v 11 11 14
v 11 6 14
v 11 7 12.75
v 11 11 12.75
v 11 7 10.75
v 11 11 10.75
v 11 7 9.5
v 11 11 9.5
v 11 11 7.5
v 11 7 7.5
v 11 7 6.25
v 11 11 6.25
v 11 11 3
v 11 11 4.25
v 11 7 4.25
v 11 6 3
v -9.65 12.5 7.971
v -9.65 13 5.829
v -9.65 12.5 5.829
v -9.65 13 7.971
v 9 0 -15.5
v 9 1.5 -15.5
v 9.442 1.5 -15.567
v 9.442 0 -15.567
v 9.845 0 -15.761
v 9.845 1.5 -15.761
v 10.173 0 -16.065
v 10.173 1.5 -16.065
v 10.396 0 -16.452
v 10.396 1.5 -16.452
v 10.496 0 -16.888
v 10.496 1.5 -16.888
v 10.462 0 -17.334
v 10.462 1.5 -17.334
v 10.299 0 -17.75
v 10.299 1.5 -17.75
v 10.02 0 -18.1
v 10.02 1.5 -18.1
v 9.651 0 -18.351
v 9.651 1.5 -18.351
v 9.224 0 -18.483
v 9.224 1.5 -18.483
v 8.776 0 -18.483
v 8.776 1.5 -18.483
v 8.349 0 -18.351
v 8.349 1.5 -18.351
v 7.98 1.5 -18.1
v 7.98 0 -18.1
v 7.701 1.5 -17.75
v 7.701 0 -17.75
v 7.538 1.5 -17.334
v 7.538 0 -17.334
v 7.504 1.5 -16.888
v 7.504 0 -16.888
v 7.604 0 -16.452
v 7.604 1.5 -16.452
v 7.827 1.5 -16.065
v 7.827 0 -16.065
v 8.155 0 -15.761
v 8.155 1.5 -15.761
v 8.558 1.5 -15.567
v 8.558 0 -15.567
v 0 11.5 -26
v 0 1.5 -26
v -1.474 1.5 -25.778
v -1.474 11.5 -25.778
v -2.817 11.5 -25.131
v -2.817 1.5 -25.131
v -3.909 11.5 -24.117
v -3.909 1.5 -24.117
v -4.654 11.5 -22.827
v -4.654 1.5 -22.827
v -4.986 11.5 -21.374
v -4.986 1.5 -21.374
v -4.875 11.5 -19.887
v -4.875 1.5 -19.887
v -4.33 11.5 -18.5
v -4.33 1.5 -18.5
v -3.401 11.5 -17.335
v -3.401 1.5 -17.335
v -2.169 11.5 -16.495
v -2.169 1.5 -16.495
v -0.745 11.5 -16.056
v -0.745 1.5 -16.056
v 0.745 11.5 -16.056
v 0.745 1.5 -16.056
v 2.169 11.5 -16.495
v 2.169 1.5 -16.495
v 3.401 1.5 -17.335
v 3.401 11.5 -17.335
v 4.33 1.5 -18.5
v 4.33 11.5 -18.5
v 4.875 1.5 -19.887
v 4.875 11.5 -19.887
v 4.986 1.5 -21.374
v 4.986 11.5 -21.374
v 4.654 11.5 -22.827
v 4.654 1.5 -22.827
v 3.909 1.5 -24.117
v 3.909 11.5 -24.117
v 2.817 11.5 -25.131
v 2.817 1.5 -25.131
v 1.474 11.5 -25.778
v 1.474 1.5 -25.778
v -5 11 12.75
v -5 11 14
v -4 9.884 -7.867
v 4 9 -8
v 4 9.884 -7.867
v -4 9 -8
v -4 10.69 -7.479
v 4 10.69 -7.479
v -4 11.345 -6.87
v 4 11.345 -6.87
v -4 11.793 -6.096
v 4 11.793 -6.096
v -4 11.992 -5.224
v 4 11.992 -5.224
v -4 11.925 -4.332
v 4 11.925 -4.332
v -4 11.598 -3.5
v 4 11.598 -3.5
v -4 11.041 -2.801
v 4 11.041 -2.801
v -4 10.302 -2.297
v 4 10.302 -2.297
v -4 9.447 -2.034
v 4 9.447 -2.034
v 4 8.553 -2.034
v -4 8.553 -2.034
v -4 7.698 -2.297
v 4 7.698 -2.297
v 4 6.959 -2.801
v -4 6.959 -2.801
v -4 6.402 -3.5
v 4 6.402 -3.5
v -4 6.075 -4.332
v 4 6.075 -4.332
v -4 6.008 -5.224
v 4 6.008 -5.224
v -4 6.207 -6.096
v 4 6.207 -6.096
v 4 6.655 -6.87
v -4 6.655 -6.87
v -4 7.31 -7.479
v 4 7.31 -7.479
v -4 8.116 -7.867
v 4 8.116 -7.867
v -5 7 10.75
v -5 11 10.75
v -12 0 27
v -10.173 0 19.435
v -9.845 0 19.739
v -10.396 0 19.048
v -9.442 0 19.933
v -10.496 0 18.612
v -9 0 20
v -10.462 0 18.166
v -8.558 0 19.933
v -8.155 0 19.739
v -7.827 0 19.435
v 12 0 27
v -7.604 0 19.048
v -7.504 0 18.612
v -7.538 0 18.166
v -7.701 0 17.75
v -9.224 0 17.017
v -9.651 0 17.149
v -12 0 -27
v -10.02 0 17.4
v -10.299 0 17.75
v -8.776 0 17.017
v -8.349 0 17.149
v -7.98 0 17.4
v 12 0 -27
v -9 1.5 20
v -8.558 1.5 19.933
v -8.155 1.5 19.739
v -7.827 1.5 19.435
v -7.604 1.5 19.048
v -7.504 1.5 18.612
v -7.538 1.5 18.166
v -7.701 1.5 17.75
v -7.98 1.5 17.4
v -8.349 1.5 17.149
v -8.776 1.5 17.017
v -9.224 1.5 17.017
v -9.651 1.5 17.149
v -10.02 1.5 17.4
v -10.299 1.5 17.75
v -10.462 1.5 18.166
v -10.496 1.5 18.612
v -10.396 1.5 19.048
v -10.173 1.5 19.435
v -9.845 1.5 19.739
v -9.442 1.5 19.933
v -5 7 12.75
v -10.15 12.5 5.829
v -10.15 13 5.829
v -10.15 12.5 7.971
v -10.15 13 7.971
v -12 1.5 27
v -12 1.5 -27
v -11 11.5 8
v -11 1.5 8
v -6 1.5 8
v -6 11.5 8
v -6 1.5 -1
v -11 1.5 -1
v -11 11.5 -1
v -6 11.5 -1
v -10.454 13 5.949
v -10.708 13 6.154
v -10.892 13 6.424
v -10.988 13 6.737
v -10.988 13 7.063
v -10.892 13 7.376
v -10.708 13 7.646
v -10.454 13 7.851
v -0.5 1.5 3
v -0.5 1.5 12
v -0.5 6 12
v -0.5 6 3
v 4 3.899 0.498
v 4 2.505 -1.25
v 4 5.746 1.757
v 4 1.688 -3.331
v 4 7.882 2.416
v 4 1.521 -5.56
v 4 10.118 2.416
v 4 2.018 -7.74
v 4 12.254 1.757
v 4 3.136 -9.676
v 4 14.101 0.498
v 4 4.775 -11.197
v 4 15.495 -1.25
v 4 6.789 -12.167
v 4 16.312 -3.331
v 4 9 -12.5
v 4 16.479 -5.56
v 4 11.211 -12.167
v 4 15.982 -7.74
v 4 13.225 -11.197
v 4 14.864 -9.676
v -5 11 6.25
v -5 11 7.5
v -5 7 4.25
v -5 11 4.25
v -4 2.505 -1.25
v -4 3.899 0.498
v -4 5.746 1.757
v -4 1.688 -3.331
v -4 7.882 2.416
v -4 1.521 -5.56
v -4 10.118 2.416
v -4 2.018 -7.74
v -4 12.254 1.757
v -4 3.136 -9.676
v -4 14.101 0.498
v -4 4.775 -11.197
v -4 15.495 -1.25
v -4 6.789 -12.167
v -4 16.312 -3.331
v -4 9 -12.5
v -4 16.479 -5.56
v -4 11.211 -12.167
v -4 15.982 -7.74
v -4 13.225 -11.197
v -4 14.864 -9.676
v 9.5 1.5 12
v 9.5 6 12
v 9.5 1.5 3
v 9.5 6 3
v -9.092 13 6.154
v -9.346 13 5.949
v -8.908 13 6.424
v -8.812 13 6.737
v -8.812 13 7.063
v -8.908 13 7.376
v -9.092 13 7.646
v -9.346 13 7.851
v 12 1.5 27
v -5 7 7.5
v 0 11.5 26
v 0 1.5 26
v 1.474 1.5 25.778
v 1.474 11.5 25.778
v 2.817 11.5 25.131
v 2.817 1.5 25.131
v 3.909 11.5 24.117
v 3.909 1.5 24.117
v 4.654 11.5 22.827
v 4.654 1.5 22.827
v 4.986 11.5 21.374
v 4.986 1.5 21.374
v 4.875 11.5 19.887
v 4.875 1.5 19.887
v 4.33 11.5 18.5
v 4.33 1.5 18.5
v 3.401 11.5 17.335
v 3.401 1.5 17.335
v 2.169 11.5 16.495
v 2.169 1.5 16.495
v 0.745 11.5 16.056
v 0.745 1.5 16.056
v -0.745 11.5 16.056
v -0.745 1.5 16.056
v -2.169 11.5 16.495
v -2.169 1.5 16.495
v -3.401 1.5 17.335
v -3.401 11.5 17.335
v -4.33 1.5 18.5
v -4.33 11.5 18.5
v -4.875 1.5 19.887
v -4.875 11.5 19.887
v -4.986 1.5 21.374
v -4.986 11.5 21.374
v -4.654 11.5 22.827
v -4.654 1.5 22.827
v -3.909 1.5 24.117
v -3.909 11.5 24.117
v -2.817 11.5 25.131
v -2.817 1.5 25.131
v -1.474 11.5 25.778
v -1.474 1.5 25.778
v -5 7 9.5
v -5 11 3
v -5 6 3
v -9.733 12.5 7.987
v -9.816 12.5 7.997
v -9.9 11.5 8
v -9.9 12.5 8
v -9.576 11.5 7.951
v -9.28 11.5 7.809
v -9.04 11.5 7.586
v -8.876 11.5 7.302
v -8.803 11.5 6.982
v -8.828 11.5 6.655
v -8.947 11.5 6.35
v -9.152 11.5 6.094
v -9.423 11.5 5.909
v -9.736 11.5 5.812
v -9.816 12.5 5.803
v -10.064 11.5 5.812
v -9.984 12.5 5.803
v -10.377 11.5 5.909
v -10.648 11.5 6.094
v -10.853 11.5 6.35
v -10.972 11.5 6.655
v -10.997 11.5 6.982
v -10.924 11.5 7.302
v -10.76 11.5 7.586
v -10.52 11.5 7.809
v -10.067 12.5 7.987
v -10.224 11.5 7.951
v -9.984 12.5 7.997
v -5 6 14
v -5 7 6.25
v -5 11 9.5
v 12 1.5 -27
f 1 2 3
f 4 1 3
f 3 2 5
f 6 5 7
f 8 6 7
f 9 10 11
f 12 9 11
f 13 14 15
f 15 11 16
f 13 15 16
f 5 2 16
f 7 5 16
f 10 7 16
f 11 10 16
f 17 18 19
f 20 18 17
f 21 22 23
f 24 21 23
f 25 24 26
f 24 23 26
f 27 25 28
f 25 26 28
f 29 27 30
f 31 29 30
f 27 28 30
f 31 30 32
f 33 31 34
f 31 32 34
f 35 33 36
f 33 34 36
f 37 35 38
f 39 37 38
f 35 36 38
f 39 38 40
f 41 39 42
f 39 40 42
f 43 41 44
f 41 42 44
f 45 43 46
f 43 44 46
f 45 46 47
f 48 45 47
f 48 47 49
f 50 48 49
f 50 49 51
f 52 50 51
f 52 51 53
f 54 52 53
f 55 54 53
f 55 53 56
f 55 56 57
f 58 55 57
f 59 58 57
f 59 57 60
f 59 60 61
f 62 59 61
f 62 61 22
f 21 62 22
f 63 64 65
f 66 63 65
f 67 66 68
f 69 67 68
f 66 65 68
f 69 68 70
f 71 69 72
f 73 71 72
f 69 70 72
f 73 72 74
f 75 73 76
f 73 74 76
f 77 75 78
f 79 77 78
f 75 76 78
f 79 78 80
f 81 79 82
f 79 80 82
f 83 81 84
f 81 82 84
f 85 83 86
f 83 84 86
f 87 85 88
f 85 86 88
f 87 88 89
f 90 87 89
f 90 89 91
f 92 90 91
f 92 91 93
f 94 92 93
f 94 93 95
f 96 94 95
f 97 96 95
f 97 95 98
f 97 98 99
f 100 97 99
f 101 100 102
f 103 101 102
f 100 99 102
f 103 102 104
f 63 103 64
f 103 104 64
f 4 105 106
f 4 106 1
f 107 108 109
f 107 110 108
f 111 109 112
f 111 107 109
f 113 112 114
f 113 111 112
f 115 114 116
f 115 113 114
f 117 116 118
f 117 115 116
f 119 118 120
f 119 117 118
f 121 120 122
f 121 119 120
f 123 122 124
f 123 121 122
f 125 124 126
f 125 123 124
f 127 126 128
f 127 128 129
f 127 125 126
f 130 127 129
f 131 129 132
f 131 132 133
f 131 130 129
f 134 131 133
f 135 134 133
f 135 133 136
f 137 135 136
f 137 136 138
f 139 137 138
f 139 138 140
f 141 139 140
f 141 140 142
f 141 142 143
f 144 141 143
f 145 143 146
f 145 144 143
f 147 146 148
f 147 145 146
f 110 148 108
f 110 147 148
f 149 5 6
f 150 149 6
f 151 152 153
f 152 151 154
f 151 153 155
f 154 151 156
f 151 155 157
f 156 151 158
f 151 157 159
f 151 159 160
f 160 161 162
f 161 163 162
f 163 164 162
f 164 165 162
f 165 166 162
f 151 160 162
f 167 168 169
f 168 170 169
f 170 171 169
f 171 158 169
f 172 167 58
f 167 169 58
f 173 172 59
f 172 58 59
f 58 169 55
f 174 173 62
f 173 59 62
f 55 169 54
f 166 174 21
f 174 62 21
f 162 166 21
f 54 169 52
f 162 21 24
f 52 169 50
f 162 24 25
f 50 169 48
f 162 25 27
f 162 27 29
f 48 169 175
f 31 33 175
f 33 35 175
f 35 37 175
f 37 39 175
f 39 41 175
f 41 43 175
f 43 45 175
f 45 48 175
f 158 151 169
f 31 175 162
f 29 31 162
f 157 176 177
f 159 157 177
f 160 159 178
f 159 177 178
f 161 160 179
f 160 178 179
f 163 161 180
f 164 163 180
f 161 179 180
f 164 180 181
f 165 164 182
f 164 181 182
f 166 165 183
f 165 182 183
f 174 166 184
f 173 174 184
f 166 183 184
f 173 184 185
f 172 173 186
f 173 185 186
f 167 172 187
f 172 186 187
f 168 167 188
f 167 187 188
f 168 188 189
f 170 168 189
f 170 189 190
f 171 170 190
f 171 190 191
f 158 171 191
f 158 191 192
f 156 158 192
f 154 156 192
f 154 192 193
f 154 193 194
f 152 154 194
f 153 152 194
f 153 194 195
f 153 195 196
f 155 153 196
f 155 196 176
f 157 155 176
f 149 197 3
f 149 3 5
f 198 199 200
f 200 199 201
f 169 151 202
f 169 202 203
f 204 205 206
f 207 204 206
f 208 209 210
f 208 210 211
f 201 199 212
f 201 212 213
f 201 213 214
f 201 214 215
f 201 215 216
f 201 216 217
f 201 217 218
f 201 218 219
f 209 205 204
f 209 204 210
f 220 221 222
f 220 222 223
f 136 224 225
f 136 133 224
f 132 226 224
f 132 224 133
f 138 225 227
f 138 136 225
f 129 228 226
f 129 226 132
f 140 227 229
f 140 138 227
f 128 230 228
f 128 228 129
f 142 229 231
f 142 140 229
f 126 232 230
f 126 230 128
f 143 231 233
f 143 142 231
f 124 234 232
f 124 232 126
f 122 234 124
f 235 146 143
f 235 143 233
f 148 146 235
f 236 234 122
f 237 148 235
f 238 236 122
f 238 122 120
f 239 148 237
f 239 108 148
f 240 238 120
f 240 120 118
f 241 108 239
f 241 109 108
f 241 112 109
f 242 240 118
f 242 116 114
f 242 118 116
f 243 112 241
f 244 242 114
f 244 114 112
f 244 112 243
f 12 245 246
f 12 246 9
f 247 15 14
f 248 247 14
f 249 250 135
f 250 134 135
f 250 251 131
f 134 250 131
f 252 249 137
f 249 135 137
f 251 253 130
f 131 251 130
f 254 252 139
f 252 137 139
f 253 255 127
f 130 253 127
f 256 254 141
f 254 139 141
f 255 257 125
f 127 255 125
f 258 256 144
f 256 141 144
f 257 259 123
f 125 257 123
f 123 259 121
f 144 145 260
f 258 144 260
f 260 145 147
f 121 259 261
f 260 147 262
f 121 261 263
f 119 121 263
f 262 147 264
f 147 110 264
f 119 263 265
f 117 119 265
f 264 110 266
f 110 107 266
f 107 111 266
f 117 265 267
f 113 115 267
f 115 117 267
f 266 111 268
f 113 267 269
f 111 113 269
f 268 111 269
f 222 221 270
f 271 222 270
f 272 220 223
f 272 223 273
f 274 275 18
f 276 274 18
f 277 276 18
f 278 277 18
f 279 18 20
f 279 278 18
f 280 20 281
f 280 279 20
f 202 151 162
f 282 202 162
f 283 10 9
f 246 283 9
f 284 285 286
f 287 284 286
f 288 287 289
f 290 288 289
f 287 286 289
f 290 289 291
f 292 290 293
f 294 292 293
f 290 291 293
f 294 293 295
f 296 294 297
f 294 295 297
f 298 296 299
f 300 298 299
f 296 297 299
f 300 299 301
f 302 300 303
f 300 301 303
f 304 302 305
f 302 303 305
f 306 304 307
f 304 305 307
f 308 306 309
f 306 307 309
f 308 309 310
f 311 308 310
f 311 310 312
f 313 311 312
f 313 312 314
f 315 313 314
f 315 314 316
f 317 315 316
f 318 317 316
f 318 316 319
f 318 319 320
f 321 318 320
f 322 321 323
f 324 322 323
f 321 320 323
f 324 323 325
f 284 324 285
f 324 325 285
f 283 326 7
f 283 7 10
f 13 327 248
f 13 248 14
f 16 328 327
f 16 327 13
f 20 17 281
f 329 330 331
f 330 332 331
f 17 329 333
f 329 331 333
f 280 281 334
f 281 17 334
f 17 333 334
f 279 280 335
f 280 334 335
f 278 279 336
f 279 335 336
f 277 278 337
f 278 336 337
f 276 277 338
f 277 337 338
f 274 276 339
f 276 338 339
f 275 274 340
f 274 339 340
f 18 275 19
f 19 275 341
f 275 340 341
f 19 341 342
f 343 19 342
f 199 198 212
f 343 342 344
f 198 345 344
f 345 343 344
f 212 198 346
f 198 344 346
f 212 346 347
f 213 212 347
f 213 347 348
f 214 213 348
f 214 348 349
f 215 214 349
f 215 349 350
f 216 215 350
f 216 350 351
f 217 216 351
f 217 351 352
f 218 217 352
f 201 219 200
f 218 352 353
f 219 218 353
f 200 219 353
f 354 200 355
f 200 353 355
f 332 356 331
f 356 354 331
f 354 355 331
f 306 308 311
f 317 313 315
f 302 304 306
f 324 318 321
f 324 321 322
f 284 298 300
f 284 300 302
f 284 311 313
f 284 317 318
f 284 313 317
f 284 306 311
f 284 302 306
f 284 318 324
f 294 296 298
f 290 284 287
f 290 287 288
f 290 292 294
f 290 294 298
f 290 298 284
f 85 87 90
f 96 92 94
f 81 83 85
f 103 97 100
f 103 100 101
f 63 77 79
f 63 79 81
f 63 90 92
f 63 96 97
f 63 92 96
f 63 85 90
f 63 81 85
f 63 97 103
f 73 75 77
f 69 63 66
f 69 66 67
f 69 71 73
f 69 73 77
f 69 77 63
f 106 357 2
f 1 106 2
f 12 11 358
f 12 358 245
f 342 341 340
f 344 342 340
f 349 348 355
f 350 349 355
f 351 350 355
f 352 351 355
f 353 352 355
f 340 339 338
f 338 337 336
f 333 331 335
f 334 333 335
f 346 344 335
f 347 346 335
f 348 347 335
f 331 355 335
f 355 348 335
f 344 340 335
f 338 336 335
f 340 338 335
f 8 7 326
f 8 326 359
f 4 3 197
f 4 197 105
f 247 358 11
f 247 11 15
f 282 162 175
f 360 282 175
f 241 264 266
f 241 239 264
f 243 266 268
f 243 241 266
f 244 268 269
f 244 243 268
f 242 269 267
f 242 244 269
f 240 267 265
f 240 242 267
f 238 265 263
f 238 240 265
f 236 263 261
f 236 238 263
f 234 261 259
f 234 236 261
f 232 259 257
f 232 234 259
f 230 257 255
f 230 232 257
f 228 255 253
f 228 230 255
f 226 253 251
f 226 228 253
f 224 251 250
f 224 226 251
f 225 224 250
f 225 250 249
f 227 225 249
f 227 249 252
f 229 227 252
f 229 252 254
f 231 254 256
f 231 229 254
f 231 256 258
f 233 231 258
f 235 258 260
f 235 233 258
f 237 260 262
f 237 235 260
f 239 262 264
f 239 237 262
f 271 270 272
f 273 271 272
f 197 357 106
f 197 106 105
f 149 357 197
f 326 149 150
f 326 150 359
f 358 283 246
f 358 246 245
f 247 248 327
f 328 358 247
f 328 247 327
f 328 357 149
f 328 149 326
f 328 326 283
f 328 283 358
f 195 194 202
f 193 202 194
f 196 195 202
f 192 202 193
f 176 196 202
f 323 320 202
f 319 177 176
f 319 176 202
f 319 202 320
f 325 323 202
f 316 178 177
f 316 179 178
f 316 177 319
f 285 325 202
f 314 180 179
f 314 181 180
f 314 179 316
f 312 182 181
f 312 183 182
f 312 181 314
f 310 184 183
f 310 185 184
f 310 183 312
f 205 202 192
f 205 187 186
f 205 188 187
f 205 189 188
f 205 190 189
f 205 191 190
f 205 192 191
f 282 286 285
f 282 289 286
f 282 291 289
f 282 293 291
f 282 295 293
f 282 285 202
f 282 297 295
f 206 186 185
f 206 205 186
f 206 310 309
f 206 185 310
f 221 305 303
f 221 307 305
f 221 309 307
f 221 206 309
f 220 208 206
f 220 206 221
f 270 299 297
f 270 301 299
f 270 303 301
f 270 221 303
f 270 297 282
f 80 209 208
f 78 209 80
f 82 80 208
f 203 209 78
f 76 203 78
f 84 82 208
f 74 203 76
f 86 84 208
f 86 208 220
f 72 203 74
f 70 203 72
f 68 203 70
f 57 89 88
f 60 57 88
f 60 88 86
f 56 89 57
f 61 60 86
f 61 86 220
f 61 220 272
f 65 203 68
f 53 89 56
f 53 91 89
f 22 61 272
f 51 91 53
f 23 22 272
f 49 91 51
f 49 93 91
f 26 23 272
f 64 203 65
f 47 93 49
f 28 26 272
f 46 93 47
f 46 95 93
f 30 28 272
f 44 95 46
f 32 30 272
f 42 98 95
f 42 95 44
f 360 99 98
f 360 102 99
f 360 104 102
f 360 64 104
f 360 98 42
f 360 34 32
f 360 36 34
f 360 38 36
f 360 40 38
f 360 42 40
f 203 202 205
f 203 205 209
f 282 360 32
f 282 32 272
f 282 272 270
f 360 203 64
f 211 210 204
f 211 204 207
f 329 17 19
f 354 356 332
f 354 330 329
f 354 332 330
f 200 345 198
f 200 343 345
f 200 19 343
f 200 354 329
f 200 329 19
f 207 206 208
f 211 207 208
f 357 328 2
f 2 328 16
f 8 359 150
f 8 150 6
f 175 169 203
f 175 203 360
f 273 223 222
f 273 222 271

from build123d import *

# Parameters (mm, degrees)
SKETCH1_W           = 24
SKETCH1_H           = 54
BOSS_EXTRUDE1_DEPTH = 1.5
SKETCH2_R           = 1.5
CUT_EXTRUDE1_DEPTH  = 30.584624385
SKETCH3_R           = 5
BOSS_EXTRUDE2_DEPTH = 10
SKETCH4_W           = 5
SKETCH4_H           = 9
BOSS_EXTRUDE3_DEPTH = 10
SKETCH5_R           = 1.1
BOSS_EXTRUDE4_DEPTH = 1.5
SKETCH6_W           = 0.5
SKETCH6_H           = 2.2
CUT_EXTRUDE2_DEPTH  = 0.5
SKETCH7_R           = 7.5
SKETCH7_R_2         = 3
BOSS_EXTRUDE5_DEPTH = 4
SKETCH8_W           = 10
SKETCH8_H           = 9
BOSS_EXTRUDE6_DEPTH = 4.5
SKETCH9_W           = 16
SKETCH9_H           = 11
BOSS_EXTRUDE7_DEPTH = 5
SKETCH10_W          = 2
SKETCH10_H          = 4
CUT_EXTRUDE3_DEPTH  = 16


with BuildPart() as part:
    # Sketch1 → Boss-Extrude1 (new body)
    with BuildSketch(Plane(origin=(0, 0, 0), x_dir=(1, 0, 0), z_dir=(0, 1, 0))):
        Rectangle(SKETCH1_W, SKETCH1_H)
    extrude(amount=BOSS_EXTRUDE1_DEPTH)

    # Sketch2 → Cut-Extrude1 (cut, through all)
    with BuildSketch(Plane(origin=(0, 1.5, 0), x_dir=(1, 0, 0), z_dir=(0, 1, 0))):
        with Locations(Location((9, 17, 0), (0, 0, 270))):
            Circle(SKETCH2_R)
        with Locations(Location((-9, -18.5, 0), (0, 0, 270))):
            Circle(SKETCH2_R)
    extrude(amount=-CUT_EXTRUDE1_DEPTH, mode=Mode.SUBTRACT)

    # Sketch3 → Boss-Extrude2 (add)
    with BuildSketch(Plane(origin=(0, 1.5, 0), x_dir=(1, 0, 0), z_dir=(0, 1, 0))):
        with Locations(Location((0, -21, 0), (0, 0, 270))):
            Circle(SKETCH3_R)
        with Locations(Location((0, 21, 0), (0, 0, 90))):
            Circle(SKETCH3_R)
    extrude(amount=BOSS_EXTRUDE2_DEPTH)

    # Sketch4 → Boss-Extrude3 (add)
    with BuildSketch(Plane(origin=(0, 1.5, 0), x_dir=(1, 0, 0), z_dir=(0, 1, 0))):
        with Locations((-8.5, -3.5)):
            Rectangle(SKETCH4_W, SKETCH4_H)
    extrude(amount=BOSS_EXTRUDE3_DEPTH)

    # Sketch8 → Boss-Extrude6 (add)
    with BuildSketch(Plane(origin=(0, 1.5, 0), x_dir=(1, 0, 0), z_dir=(0, 1, 0))):
        with Locations((4.5, -7.5)):
            Rectangle(SKETCH8_W, SKETCH8_H)
    extrude(amount=BOSS_EXTRUDE6_DEPTH)


with BuildPart() as body_2:
    # Sketch5 → Boss-Extrude4 (new body)
    with BuildSketch(Plane(origin=(0, 11.5, 0), x_dir=(-1, 0, 0), z_dir=(0, 1, 0))):
        with Locations(Location((9.9, 6.9, 0), (0, 0, 90))):
            Circle(SKETCH5_R)
    extrude(amount=BOSS_EXTRUDE4_DEPTH)

    # Sketch6 → Cut-Extrude2 (cut)
    with BuildSketch(Plane(origin=(0, 13, 0), x_dir=(-1, 0, 0), z_dir=(0, 1, 0))):
        with Locations((9.9, 6.9)):
            Rectangle(SKETCH6_W, SKETCH6_H)
    extrude(amount=-CUT_EXTRUDE2_DEPTH, mode=Mode.SUBTRACT)


with BuildPart() as body_3:
    # Sketch7 → Boss-Extrude5 (new, symmetric)
    with BuildSketch(Plane(origin=(0, 0, 0), x_dir=(0, 0, -1), z_dir=(1, 0, 0))):
        with Locations((5, 9)):
            Circle(SKETCH7_R)
        with Locations((5, 9)):
            Circle(SKETCH7_R_2, mode=Mode.SUBTRACT)
    extrude(amount=BOSS_EXTRUDE5_DEPTH, both=True)


with BuildPart() as body_4:
    # Sketch9 → Boss-Extrude7 (new body)
    with BuildSketch(Plane(origin=(0, 6, 0), x_dir=(1, 0, 0), z_dir=(0, 1, 0))):
        with Locations((3, -8.5)):
            Rectangle(SKETCH9_W, SKETCH9_H)
    extrude(amount=BOSS_EXTRUDE7_DEPTH)

    # Sketch10 → Cut-Extrude3 (cut)
    with BuildSketch(Plane(origin=(11, 0, 0), x_dir=(0, 0, -1), z_dir=(1, 0, 0))):
        with Locations((-11.75, 9)):
            Rectangle(SKETCH10_W, SKETCH10_H)
        with Locations((-8.5, 9)):
            Rectangle(SKETCH10_W, SKETCH10_H)
        with Locations((-5.25, 9)):
            Rectangle(SKETCH10_W, SKETCH10_H)
    extrude(amount=-CUT_EXTRUDE3_DEPTH, mode=Mode.SUBTRACT)


solid = Compound([part.part, body_2.part, body_3.part, body_4.part])
